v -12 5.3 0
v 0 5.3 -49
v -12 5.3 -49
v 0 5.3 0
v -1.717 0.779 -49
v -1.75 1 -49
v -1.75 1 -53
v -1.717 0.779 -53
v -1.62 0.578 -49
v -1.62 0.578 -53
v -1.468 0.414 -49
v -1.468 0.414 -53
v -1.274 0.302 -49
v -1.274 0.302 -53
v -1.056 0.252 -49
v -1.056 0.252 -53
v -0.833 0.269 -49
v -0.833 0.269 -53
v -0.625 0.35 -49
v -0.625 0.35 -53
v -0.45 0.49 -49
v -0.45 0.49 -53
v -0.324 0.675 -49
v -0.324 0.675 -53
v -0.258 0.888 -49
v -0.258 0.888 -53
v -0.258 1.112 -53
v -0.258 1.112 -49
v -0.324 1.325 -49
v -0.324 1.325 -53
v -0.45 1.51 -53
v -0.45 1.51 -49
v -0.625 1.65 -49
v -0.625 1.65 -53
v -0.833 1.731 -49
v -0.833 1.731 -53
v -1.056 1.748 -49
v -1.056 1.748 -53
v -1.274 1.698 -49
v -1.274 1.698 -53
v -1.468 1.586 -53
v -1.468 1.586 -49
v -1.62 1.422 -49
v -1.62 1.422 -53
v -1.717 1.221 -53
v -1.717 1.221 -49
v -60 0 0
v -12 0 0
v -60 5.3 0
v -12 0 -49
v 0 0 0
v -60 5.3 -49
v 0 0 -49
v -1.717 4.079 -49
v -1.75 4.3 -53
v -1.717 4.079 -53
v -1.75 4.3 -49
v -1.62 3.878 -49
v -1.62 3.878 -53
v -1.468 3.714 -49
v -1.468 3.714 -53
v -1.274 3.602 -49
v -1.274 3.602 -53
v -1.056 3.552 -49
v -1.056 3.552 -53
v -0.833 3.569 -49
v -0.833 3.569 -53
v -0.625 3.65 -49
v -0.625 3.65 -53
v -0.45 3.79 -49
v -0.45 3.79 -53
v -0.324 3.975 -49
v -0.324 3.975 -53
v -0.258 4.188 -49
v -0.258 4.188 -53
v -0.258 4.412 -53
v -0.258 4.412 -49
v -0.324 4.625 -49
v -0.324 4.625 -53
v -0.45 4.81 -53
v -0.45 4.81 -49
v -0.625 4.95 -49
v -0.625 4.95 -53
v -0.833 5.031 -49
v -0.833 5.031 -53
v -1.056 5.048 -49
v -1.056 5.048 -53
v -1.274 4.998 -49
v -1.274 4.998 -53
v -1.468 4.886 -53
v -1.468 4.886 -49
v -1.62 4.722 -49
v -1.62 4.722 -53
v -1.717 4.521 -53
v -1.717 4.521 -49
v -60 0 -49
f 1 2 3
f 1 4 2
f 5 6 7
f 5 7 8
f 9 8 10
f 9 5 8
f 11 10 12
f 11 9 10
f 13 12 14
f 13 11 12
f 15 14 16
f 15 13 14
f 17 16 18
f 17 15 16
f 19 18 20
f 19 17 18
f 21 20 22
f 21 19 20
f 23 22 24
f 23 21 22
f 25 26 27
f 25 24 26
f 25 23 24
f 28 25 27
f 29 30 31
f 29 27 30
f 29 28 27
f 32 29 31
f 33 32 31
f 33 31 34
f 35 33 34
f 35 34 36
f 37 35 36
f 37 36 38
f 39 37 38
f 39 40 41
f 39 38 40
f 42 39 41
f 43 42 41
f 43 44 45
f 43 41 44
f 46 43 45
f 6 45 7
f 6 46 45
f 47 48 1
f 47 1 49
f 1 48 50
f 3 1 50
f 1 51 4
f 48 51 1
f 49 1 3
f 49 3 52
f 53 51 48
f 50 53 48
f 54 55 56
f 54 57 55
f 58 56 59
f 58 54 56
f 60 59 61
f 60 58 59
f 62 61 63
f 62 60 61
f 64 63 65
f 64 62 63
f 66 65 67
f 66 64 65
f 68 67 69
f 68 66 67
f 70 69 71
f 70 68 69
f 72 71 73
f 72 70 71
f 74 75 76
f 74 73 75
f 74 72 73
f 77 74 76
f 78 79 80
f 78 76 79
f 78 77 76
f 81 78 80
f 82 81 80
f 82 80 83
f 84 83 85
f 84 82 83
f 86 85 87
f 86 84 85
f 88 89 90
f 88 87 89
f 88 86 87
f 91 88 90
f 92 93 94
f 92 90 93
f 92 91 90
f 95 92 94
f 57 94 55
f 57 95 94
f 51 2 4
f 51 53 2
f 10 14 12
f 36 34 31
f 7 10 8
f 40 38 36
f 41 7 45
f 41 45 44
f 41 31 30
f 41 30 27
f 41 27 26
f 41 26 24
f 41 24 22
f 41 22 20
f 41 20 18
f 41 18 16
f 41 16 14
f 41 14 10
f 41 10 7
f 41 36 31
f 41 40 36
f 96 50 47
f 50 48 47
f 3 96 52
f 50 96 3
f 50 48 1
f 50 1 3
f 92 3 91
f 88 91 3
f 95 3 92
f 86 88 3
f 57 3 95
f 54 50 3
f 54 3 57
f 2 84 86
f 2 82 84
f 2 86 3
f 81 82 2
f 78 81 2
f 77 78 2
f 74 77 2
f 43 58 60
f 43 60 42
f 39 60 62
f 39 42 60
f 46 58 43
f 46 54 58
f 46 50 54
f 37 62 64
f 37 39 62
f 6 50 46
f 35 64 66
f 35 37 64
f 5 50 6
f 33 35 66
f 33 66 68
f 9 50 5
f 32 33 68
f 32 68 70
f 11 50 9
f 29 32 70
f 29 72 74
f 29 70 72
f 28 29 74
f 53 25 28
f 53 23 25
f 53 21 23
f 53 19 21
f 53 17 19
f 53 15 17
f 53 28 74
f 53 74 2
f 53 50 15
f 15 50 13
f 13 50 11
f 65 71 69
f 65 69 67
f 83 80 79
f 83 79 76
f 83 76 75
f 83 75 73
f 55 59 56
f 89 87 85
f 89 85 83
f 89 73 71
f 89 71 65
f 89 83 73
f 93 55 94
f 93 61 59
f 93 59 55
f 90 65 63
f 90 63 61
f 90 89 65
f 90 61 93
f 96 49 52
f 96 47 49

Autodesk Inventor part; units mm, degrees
ref_plane "YZ Plane" through (0, 0, 0) normal (1, 0, 0) x (0, 1, 0)
ref_plane "XZ Plane" through (0, 0, 0) normal (0, 1, 0) x (-1, 0, 0)
ref_plane "XY Plane" through (0, 0, 0) normal (0, 0, 1) x (1, 0, 0)
sketch "Sketch1" plane through (0, 0, 0) normal (0, 1, 0) x (-1, 0, 0)
  line L0 (0, 0) -> (60, 0)
  line L1 (60, 0) -> (60, -49)
  line L2 (60, -49) -> (0, -49)
  line L3 (0, -49) -> (0, 0)
  dimension "d0" = 60
  dimension "d1" = 49
extrude "Extrusion1" add sketch "Sketch1" along normal blind 5.3
sketch "Sketch2" plane through (0, 5.3, 0) normal (0, 1, 0) x (1, 0, 0)
  line L0 (-60, 0) -> (0, 0) projected
  line L1 (-12, 0) -> (-12, 49)
  line L2 (0, 49) -> (-60, 49) projected
  line L3 (0, 0) -> (0, 49) projected
  dimension "d4" = 12
split body "Split1" sketch "Sketch2" result two bodies curves L1 first body at (-44, 0.5, -32.6667)
sketch "Sketch3" plane through (0, 0, -49) normal (0, 0, -1) x (-1, 0, 0)
  circle A0 centre (1, 4.3) radius 0.75
  circle A1 centre (1, 1) radius 0.75
  line L0 (0, 0) -> (0, 5.3) projected
  line L1 (0, 5.3) -> (12, 5.3) projected
  line L2 (0, 0) -> (12, 0) projected
  dimension "d5" = 1
  dimension "d6" = 1
  dimension "d7" = 1.5
  dimension "d8" = 1.5
  dimension "d9" = 1
  dimension "d10" = 1
extrude "Extrusion2" add sketch "Sketch3" along normal blind 4 bodies 3
properties part number "bateria"
